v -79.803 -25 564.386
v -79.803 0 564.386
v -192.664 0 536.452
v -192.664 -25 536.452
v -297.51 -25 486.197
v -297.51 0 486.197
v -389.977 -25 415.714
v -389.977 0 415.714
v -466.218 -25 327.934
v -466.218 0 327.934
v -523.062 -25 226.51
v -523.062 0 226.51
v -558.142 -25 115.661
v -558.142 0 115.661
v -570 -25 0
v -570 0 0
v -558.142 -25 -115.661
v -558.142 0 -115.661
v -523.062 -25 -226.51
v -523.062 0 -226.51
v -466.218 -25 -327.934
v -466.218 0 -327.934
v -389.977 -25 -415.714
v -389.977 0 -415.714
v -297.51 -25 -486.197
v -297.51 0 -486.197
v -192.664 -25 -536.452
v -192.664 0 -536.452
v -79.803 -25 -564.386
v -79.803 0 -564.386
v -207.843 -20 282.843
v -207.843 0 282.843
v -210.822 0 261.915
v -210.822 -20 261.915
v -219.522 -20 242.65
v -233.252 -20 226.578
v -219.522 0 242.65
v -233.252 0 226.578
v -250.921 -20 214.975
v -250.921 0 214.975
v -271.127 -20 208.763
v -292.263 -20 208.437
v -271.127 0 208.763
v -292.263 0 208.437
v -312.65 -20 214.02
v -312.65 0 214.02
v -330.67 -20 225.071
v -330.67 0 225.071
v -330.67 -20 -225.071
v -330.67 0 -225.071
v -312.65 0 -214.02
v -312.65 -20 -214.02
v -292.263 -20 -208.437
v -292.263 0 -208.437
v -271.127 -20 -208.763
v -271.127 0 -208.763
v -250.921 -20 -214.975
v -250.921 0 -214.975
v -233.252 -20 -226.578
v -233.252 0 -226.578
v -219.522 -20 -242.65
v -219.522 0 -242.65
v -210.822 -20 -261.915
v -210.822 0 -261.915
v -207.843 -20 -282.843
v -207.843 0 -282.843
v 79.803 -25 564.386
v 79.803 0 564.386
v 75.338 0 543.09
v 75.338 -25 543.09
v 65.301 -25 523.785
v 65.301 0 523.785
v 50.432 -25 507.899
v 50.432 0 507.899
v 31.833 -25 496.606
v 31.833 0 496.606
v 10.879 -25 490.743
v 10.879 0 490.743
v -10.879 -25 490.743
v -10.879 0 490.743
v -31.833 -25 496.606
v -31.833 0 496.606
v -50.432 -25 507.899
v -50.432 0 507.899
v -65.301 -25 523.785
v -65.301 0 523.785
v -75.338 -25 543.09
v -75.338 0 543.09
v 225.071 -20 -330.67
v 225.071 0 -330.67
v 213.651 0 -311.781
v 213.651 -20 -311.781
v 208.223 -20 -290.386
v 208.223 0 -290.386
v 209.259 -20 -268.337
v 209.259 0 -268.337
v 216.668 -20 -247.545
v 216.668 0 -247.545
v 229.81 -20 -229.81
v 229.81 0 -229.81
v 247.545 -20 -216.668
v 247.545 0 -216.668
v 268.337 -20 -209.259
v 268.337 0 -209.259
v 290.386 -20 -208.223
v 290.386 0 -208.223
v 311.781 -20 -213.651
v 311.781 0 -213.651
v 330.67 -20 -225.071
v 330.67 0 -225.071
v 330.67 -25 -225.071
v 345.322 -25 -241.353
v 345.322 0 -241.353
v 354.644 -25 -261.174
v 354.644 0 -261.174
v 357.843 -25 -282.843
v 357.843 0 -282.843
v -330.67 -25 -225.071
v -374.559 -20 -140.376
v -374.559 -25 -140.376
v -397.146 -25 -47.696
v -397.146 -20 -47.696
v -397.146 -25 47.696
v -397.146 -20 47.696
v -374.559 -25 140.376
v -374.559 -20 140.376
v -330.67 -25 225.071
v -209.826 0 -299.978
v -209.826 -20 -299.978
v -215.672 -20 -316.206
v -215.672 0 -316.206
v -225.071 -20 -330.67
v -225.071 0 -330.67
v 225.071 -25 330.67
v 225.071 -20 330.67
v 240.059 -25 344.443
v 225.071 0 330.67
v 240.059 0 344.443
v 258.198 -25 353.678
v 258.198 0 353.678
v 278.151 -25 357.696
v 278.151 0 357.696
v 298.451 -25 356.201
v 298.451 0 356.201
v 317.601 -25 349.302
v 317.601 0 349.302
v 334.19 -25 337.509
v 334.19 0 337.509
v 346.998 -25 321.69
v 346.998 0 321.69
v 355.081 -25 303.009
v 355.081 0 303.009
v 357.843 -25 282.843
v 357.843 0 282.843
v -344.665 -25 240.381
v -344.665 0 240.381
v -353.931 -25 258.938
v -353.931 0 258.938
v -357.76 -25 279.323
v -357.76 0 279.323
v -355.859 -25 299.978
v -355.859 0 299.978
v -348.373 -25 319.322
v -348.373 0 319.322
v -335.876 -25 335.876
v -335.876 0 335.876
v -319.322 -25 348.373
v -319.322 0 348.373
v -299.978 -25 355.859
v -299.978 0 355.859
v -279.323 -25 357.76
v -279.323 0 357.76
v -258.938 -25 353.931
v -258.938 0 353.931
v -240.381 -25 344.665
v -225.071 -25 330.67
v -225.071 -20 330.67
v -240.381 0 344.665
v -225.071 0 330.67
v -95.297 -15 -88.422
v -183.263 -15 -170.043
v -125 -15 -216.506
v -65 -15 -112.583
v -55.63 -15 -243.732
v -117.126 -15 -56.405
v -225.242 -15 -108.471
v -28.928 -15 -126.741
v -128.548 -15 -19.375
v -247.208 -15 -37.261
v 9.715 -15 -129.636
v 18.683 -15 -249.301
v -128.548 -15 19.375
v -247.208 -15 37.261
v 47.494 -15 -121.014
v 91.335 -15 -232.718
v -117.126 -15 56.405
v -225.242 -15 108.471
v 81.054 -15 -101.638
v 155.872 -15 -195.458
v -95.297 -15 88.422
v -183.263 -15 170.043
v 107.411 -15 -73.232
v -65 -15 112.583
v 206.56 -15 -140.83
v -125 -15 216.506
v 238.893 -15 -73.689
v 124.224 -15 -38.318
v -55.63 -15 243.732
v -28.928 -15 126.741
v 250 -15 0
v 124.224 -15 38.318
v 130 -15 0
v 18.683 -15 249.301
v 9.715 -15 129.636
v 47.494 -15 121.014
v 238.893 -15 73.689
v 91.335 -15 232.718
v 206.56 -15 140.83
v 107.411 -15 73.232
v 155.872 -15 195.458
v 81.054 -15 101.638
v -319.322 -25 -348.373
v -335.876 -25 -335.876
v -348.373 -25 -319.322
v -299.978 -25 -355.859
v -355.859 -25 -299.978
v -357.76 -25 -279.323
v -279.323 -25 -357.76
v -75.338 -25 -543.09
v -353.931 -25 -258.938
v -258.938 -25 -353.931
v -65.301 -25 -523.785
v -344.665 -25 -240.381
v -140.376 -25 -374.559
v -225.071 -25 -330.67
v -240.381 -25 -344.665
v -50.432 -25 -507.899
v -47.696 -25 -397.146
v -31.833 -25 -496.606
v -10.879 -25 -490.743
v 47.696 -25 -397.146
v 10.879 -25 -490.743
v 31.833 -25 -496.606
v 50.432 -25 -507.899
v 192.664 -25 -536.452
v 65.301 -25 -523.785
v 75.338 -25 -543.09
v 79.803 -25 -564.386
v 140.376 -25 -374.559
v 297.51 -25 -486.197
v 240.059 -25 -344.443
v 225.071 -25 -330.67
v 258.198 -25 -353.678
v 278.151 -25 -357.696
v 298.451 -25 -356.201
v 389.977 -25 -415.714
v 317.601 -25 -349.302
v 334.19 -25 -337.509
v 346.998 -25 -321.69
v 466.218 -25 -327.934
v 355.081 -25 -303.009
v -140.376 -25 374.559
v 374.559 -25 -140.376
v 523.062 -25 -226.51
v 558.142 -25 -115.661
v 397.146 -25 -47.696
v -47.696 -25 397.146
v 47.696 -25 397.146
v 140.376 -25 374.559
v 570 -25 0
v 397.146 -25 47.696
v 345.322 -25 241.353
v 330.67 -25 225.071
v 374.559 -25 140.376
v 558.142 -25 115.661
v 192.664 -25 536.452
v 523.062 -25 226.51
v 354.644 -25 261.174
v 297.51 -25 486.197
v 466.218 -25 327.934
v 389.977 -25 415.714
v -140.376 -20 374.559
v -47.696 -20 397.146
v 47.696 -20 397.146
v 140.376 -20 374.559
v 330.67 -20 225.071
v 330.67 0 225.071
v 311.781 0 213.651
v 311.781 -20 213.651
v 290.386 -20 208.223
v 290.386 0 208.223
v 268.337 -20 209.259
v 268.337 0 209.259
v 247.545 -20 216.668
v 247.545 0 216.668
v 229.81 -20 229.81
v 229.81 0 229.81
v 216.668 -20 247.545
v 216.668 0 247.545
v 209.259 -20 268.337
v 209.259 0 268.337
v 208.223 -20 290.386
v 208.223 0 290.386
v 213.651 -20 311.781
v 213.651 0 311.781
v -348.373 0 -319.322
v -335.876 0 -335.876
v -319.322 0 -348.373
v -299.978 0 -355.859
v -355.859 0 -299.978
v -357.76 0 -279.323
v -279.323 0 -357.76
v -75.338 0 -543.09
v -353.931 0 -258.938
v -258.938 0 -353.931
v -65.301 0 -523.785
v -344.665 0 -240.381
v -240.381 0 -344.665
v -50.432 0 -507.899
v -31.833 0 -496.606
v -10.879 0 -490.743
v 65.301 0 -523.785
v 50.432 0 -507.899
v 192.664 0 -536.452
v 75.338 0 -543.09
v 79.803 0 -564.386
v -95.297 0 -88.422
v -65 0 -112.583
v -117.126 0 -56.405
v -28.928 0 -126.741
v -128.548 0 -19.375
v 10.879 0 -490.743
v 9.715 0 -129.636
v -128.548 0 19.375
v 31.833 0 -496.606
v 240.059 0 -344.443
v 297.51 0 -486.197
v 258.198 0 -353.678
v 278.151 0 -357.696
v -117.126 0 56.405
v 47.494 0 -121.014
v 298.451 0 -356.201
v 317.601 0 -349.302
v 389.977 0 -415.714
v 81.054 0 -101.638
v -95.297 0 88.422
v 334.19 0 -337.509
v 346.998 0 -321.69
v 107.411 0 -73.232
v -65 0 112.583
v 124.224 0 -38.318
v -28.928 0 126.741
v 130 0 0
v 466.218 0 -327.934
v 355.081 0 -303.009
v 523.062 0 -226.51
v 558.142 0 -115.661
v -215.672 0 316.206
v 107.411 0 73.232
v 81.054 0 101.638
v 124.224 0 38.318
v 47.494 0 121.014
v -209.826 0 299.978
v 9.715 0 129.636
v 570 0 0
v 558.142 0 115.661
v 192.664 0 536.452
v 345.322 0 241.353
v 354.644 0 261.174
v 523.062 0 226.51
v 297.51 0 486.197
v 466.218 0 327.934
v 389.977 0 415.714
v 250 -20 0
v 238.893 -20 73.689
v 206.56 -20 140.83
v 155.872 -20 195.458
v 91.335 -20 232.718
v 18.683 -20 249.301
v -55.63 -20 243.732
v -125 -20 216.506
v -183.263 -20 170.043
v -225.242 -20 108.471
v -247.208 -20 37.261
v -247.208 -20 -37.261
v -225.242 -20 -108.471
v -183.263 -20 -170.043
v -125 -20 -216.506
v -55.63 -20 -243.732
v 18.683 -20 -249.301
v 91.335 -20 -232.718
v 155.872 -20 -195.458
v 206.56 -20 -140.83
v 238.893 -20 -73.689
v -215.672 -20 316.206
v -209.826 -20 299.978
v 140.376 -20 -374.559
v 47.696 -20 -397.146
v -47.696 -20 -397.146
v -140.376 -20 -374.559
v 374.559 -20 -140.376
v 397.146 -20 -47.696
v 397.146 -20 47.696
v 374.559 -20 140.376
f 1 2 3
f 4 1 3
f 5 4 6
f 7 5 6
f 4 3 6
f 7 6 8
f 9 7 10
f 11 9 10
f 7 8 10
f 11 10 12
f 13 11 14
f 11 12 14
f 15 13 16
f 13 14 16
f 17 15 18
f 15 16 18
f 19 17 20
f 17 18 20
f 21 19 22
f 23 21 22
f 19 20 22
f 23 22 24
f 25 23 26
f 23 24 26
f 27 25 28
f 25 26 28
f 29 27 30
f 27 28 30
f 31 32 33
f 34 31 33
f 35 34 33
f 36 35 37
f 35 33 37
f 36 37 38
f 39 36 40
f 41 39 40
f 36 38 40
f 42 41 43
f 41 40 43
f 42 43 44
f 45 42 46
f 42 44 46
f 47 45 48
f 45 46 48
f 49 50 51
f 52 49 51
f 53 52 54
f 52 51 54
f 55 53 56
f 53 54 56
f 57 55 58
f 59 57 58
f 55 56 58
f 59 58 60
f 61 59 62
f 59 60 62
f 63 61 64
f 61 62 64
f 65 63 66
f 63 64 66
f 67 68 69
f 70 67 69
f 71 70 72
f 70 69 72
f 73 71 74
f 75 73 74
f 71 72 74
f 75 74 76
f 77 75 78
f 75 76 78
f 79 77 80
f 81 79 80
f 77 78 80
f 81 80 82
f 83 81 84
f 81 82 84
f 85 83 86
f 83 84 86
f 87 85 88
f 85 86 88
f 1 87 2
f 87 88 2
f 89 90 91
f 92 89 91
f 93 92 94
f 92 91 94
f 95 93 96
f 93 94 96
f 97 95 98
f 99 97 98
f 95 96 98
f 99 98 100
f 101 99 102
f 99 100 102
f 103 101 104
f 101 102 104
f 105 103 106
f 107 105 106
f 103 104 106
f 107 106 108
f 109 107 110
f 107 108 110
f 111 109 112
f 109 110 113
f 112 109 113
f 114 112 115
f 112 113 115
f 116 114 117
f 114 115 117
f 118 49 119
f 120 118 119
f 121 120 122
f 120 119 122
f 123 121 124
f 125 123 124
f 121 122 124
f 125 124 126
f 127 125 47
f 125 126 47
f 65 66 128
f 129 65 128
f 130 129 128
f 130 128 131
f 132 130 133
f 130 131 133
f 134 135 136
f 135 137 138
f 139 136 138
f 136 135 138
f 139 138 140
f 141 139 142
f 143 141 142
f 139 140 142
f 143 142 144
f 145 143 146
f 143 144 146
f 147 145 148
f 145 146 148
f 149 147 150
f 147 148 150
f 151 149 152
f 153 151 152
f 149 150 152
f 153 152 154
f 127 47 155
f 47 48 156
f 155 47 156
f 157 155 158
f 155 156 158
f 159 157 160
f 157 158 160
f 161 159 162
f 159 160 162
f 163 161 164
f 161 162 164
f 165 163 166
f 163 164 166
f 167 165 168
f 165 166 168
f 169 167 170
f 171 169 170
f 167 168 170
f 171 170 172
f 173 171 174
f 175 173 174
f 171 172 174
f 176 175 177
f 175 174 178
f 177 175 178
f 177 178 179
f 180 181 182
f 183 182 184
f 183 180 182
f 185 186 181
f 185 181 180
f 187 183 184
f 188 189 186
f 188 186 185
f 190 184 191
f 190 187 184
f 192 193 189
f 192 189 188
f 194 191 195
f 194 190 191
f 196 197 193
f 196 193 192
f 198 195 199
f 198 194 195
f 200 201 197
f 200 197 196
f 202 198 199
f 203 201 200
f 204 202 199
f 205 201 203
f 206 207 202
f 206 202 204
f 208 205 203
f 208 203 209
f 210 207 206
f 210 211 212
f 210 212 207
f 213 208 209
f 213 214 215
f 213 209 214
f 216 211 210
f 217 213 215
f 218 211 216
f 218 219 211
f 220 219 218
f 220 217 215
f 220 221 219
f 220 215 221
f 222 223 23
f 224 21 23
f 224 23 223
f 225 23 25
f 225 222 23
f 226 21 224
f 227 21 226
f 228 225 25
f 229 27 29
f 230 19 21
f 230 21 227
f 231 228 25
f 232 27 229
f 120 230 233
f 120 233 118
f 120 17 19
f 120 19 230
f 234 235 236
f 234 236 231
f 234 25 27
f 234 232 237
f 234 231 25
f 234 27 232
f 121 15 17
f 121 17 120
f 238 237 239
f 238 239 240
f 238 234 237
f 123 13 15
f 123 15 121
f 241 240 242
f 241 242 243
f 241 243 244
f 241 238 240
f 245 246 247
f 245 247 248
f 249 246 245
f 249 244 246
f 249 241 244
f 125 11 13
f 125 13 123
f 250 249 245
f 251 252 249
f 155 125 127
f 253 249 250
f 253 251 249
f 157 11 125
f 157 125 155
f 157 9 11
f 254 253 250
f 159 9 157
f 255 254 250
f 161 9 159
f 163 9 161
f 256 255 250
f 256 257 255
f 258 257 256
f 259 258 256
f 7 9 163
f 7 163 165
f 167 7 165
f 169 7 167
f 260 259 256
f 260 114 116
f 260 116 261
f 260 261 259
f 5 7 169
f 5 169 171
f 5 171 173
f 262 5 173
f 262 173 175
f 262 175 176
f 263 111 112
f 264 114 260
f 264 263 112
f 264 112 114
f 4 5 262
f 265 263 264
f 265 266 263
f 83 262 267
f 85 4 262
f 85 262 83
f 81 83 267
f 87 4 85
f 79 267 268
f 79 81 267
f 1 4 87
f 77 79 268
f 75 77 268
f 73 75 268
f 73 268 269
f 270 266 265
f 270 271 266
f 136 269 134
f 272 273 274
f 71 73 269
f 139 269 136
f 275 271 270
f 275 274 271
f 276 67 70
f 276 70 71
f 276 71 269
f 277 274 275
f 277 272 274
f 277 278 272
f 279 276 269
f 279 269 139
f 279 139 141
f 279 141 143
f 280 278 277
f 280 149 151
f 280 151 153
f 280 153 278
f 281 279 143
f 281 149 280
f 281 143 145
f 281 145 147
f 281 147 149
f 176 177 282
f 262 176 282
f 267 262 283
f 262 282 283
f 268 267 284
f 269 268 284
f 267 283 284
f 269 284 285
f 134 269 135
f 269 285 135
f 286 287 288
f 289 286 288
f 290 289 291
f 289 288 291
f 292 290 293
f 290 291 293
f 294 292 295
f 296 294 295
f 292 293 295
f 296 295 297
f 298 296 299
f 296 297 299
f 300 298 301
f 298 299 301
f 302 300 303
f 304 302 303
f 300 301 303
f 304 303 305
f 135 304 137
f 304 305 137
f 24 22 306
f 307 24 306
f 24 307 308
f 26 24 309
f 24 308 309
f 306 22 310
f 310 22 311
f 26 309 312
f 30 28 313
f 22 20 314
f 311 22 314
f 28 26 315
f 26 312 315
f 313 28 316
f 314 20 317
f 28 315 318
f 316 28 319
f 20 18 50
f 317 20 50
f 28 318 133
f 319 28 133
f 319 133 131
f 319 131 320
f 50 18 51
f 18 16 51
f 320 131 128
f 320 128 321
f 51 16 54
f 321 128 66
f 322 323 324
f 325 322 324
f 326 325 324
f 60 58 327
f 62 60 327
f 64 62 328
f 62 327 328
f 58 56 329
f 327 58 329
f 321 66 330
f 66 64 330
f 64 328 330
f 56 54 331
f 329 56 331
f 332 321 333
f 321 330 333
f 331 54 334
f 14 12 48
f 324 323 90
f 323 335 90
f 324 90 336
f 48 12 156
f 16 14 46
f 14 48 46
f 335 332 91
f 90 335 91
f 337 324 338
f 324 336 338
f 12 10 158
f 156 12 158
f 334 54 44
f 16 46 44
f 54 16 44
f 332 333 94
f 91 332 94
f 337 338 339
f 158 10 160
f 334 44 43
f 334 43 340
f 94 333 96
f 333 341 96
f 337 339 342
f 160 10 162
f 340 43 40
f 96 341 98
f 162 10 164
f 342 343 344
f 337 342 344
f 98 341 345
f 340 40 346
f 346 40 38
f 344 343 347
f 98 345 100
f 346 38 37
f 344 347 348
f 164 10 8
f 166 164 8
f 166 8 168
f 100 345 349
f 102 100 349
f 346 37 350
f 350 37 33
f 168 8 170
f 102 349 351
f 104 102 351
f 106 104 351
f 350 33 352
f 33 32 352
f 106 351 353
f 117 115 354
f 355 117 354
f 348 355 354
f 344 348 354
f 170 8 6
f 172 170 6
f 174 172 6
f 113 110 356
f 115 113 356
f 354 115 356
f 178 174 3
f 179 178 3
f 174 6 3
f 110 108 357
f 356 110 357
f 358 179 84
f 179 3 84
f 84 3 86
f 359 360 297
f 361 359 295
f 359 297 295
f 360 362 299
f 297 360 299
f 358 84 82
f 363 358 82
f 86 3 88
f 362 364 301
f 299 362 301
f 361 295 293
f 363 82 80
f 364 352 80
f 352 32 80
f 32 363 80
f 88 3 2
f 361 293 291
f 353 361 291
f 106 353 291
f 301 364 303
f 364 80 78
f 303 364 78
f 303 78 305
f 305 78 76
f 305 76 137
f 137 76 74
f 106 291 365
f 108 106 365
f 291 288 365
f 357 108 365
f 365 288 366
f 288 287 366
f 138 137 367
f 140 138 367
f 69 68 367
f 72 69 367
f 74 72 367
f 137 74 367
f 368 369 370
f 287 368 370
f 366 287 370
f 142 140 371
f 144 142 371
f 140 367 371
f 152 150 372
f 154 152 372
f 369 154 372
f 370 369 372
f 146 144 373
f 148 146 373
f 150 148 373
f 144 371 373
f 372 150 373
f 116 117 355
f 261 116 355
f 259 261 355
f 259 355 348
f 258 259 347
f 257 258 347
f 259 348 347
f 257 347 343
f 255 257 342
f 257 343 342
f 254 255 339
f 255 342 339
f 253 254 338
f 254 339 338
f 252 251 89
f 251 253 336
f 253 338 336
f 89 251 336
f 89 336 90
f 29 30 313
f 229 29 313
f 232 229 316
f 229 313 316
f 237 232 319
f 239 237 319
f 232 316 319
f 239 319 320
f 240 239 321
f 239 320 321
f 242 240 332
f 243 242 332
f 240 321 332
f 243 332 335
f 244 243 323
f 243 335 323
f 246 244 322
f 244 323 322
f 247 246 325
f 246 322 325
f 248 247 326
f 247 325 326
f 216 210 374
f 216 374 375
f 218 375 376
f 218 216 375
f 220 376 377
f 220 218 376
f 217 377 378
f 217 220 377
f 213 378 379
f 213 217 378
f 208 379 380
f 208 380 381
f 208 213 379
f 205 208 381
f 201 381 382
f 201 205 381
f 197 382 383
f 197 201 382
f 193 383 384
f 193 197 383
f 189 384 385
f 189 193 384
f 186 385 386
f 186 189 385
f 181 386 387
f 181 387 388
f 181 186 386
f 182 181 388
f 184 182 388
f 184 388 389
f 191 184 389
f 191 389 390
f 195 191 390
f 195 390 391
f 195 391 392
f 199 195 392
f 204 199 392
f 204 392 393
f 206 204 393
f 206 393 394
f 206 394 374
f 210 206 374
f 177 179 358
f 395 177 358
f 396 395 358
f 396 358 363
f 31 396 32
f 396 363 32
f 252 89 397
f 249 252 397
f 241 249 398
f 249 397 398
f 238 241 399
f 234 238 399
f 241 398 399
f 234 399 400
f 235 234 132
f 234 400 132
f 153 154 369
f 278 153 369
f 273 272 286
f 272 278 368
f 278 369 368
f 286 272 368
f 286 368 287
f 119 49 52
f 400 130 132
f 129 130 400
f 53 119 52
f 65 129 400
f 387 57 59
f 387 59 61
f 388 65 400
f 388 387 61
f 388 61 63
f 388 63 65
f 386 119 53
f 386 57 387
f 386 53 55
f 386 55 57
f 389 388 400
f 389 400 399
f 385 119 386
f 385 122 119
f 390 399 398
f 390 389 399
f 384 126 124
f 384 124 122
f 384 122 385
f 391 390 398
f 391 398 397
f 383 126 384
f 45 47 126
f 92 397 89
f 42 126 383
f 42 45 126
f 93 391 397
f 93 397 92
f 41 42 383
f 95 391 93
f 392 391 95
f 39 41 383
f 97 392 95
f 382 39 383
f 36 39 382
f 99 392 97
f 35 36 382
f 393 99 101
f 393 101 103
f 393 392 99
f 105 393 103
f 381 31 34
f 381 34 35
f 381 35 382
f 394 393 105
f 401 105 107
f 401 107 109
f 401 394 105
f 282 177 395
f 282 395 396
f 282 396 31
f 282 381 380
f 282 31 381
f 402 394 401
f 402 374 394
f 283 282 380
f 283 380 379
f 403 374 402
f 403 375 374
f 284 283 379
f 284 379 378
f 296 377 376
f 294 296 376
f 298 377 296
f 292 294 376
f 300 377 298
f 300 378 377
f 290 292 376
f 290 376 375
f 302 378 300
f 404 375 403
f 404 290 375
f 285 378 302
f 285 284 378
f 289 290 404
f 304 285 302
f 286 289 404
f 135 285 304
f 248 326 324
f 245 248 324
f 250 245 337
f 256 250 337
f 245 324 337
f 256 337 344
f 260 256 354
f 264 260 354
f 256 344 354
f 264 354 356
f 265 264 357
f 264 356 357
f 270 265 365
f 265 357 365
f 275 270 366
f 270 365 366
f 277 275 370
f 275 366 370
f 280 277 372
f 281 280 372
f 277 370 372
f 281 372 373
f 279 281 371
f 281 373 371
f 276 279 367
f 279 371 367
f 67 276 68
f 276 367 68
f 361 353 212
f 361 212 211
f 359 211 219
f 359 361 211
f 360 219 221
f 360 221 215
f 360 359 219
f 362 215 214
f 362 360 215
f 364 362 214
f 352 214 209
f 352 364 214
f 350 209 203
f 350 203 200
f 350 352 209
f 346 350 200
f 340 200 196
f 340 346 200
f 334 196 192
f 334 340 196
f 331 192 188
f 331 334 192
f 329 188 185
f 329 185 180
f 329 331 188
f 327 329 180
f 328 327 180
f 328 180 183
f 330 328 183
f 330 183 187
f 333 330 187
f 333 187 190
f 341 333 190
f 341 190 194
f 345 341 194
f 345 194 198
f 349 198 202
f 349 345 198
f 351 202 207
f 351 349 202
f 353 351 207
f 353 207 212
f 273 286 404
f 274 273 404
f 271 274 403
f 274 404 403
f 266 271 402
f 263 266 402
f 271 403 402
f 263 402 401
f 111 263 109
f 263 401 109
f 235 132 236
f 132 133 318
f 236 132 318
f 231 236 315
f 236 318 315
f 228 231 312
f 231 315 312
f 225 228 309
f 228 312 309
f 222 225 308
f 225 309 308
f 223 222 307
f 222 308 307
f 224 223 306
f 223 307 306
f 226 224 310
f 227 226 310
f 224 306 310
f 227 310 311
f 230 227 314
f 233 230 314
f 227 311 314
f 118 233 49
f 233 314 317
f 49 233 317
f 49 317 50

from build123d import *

# Parameters (mm, degrees)
F1_DEPTH = 25
F0_R     = 250
F2_DEPTH = 20
F0_R_2   = 130
F3_DEPTH = 15


with BuildPart() as f1:
    # F0 (on Front) → F1 (new body)
    with BuildSketch(Plane.XZ):
        with BuildLine():
            ThreePointArc((79.802773, 564.385965), (0, 490), (-79.802773, 564.385965))
            ThreePointArc((-79.802773, 564.385965), (-570, 0), (-79.802773, -564.385965))
            ThreePointArc((-79.802773, -564.385965), (0, -490), (79.802773, -564.385965))
            ThreePointArc((79.802773, -564.385965), (570, 0), (79.802773, 564.385965))
        make_face()
        with BuildLine():
            ThreePointArc((-330.670307, 225.071429), (-335.875721, 335.875721), (-225.071429, 330.670307))
            ThreePointArc((-225.071429, 330.670307), (0, 400), (225.071429, 330.670307))
            ThreePointArc((225.071429, 330.670307), (308.260755, 353.404197), (357.842712, 282.842712))
            ThreePointArc((357.842712, 282.842712), (350.710487, 250.921478), (330.670307, 225.071429))
            ThreePointArc((330.670307, 225.071429), (400, 0), (330.670307, -225.071429))
            ThreePointArc((330.670307, -225.071429), (350.710487, -250.921478), (357.842712, -282.842712))
            ThreePointArc((357.842712, -282.842712), (308.260755, -353.404197), (225.071429, -330.670307))
            ThreePointArc((225.071429, -330.670307), (0, -400), (-225.071429, -330.670307))
            ThreePointArc((-225.071429, -330.670307), (-335.875721, -335.875721), (-330.670307, -225.071429))
            ThreePointArc((-330.670307, -225.071429), (-400, 0), (-330.670307, 225.071429))
        make_face(mode=Mode.SUBTRACT)
    extrude(amount=F1_DEPTH)

    # F0 (on Front) → F2 (join)
    with BuildSketch(Plane.XZ):
        with BuildLine():
            ThreePointArc((-225.071429, 330.670307), (-212.281228, 308.260755), (-207.842712, 282.842712))
            ThreePointArc((-207.842712, 282.842712), (-250.921478, 214.974938), (-330.670307, 225.071429))
            ThreePointArc((-330.670307, 225.071429), (-400, 0), (-330.670307, -225.071429))
            ThreePointArc((-330.670307, -225.071429), (-250.921478, -214.974938), (-207.842712, -282.842712))
            ThreePointArc((-207.842712, -282.842712), (-212.281228, -308.260755), (-225.071429, -330.670307))
            ThreePointArc((-225.071429, -330.670307), (0, -400), (225.071429, -330.670307))
            ThreePointArc((225.071429, -330.670307), (229.809704, -229.809704), (330.670307, -225.071429))
            ThreePointArc((330.670307, -225.071429), (400, 0), (330.670307, 225.071429))
            ThreePointArc((330.670307, 225.071429), (229.809704, 229.809704), (225.071429, 330.670307))
            ThreePointArc((225.071429, 330.670307), (0, 400), (-225.071429, 330.670307))
        make_face()
        Circle(F0_R, mode=Mode.SUBTRACT)
    extrude(amount=F2_DEPTH)

    # F0 (on Front) → F3 (join)
    with BuildSketch(Plane.XZ):
        Circle(F0_R)
        Circle(F0_R_2, mode=Mode.SUBTRACT)
    extrude(amount=F3_DEPTH)


solid = f1.part
